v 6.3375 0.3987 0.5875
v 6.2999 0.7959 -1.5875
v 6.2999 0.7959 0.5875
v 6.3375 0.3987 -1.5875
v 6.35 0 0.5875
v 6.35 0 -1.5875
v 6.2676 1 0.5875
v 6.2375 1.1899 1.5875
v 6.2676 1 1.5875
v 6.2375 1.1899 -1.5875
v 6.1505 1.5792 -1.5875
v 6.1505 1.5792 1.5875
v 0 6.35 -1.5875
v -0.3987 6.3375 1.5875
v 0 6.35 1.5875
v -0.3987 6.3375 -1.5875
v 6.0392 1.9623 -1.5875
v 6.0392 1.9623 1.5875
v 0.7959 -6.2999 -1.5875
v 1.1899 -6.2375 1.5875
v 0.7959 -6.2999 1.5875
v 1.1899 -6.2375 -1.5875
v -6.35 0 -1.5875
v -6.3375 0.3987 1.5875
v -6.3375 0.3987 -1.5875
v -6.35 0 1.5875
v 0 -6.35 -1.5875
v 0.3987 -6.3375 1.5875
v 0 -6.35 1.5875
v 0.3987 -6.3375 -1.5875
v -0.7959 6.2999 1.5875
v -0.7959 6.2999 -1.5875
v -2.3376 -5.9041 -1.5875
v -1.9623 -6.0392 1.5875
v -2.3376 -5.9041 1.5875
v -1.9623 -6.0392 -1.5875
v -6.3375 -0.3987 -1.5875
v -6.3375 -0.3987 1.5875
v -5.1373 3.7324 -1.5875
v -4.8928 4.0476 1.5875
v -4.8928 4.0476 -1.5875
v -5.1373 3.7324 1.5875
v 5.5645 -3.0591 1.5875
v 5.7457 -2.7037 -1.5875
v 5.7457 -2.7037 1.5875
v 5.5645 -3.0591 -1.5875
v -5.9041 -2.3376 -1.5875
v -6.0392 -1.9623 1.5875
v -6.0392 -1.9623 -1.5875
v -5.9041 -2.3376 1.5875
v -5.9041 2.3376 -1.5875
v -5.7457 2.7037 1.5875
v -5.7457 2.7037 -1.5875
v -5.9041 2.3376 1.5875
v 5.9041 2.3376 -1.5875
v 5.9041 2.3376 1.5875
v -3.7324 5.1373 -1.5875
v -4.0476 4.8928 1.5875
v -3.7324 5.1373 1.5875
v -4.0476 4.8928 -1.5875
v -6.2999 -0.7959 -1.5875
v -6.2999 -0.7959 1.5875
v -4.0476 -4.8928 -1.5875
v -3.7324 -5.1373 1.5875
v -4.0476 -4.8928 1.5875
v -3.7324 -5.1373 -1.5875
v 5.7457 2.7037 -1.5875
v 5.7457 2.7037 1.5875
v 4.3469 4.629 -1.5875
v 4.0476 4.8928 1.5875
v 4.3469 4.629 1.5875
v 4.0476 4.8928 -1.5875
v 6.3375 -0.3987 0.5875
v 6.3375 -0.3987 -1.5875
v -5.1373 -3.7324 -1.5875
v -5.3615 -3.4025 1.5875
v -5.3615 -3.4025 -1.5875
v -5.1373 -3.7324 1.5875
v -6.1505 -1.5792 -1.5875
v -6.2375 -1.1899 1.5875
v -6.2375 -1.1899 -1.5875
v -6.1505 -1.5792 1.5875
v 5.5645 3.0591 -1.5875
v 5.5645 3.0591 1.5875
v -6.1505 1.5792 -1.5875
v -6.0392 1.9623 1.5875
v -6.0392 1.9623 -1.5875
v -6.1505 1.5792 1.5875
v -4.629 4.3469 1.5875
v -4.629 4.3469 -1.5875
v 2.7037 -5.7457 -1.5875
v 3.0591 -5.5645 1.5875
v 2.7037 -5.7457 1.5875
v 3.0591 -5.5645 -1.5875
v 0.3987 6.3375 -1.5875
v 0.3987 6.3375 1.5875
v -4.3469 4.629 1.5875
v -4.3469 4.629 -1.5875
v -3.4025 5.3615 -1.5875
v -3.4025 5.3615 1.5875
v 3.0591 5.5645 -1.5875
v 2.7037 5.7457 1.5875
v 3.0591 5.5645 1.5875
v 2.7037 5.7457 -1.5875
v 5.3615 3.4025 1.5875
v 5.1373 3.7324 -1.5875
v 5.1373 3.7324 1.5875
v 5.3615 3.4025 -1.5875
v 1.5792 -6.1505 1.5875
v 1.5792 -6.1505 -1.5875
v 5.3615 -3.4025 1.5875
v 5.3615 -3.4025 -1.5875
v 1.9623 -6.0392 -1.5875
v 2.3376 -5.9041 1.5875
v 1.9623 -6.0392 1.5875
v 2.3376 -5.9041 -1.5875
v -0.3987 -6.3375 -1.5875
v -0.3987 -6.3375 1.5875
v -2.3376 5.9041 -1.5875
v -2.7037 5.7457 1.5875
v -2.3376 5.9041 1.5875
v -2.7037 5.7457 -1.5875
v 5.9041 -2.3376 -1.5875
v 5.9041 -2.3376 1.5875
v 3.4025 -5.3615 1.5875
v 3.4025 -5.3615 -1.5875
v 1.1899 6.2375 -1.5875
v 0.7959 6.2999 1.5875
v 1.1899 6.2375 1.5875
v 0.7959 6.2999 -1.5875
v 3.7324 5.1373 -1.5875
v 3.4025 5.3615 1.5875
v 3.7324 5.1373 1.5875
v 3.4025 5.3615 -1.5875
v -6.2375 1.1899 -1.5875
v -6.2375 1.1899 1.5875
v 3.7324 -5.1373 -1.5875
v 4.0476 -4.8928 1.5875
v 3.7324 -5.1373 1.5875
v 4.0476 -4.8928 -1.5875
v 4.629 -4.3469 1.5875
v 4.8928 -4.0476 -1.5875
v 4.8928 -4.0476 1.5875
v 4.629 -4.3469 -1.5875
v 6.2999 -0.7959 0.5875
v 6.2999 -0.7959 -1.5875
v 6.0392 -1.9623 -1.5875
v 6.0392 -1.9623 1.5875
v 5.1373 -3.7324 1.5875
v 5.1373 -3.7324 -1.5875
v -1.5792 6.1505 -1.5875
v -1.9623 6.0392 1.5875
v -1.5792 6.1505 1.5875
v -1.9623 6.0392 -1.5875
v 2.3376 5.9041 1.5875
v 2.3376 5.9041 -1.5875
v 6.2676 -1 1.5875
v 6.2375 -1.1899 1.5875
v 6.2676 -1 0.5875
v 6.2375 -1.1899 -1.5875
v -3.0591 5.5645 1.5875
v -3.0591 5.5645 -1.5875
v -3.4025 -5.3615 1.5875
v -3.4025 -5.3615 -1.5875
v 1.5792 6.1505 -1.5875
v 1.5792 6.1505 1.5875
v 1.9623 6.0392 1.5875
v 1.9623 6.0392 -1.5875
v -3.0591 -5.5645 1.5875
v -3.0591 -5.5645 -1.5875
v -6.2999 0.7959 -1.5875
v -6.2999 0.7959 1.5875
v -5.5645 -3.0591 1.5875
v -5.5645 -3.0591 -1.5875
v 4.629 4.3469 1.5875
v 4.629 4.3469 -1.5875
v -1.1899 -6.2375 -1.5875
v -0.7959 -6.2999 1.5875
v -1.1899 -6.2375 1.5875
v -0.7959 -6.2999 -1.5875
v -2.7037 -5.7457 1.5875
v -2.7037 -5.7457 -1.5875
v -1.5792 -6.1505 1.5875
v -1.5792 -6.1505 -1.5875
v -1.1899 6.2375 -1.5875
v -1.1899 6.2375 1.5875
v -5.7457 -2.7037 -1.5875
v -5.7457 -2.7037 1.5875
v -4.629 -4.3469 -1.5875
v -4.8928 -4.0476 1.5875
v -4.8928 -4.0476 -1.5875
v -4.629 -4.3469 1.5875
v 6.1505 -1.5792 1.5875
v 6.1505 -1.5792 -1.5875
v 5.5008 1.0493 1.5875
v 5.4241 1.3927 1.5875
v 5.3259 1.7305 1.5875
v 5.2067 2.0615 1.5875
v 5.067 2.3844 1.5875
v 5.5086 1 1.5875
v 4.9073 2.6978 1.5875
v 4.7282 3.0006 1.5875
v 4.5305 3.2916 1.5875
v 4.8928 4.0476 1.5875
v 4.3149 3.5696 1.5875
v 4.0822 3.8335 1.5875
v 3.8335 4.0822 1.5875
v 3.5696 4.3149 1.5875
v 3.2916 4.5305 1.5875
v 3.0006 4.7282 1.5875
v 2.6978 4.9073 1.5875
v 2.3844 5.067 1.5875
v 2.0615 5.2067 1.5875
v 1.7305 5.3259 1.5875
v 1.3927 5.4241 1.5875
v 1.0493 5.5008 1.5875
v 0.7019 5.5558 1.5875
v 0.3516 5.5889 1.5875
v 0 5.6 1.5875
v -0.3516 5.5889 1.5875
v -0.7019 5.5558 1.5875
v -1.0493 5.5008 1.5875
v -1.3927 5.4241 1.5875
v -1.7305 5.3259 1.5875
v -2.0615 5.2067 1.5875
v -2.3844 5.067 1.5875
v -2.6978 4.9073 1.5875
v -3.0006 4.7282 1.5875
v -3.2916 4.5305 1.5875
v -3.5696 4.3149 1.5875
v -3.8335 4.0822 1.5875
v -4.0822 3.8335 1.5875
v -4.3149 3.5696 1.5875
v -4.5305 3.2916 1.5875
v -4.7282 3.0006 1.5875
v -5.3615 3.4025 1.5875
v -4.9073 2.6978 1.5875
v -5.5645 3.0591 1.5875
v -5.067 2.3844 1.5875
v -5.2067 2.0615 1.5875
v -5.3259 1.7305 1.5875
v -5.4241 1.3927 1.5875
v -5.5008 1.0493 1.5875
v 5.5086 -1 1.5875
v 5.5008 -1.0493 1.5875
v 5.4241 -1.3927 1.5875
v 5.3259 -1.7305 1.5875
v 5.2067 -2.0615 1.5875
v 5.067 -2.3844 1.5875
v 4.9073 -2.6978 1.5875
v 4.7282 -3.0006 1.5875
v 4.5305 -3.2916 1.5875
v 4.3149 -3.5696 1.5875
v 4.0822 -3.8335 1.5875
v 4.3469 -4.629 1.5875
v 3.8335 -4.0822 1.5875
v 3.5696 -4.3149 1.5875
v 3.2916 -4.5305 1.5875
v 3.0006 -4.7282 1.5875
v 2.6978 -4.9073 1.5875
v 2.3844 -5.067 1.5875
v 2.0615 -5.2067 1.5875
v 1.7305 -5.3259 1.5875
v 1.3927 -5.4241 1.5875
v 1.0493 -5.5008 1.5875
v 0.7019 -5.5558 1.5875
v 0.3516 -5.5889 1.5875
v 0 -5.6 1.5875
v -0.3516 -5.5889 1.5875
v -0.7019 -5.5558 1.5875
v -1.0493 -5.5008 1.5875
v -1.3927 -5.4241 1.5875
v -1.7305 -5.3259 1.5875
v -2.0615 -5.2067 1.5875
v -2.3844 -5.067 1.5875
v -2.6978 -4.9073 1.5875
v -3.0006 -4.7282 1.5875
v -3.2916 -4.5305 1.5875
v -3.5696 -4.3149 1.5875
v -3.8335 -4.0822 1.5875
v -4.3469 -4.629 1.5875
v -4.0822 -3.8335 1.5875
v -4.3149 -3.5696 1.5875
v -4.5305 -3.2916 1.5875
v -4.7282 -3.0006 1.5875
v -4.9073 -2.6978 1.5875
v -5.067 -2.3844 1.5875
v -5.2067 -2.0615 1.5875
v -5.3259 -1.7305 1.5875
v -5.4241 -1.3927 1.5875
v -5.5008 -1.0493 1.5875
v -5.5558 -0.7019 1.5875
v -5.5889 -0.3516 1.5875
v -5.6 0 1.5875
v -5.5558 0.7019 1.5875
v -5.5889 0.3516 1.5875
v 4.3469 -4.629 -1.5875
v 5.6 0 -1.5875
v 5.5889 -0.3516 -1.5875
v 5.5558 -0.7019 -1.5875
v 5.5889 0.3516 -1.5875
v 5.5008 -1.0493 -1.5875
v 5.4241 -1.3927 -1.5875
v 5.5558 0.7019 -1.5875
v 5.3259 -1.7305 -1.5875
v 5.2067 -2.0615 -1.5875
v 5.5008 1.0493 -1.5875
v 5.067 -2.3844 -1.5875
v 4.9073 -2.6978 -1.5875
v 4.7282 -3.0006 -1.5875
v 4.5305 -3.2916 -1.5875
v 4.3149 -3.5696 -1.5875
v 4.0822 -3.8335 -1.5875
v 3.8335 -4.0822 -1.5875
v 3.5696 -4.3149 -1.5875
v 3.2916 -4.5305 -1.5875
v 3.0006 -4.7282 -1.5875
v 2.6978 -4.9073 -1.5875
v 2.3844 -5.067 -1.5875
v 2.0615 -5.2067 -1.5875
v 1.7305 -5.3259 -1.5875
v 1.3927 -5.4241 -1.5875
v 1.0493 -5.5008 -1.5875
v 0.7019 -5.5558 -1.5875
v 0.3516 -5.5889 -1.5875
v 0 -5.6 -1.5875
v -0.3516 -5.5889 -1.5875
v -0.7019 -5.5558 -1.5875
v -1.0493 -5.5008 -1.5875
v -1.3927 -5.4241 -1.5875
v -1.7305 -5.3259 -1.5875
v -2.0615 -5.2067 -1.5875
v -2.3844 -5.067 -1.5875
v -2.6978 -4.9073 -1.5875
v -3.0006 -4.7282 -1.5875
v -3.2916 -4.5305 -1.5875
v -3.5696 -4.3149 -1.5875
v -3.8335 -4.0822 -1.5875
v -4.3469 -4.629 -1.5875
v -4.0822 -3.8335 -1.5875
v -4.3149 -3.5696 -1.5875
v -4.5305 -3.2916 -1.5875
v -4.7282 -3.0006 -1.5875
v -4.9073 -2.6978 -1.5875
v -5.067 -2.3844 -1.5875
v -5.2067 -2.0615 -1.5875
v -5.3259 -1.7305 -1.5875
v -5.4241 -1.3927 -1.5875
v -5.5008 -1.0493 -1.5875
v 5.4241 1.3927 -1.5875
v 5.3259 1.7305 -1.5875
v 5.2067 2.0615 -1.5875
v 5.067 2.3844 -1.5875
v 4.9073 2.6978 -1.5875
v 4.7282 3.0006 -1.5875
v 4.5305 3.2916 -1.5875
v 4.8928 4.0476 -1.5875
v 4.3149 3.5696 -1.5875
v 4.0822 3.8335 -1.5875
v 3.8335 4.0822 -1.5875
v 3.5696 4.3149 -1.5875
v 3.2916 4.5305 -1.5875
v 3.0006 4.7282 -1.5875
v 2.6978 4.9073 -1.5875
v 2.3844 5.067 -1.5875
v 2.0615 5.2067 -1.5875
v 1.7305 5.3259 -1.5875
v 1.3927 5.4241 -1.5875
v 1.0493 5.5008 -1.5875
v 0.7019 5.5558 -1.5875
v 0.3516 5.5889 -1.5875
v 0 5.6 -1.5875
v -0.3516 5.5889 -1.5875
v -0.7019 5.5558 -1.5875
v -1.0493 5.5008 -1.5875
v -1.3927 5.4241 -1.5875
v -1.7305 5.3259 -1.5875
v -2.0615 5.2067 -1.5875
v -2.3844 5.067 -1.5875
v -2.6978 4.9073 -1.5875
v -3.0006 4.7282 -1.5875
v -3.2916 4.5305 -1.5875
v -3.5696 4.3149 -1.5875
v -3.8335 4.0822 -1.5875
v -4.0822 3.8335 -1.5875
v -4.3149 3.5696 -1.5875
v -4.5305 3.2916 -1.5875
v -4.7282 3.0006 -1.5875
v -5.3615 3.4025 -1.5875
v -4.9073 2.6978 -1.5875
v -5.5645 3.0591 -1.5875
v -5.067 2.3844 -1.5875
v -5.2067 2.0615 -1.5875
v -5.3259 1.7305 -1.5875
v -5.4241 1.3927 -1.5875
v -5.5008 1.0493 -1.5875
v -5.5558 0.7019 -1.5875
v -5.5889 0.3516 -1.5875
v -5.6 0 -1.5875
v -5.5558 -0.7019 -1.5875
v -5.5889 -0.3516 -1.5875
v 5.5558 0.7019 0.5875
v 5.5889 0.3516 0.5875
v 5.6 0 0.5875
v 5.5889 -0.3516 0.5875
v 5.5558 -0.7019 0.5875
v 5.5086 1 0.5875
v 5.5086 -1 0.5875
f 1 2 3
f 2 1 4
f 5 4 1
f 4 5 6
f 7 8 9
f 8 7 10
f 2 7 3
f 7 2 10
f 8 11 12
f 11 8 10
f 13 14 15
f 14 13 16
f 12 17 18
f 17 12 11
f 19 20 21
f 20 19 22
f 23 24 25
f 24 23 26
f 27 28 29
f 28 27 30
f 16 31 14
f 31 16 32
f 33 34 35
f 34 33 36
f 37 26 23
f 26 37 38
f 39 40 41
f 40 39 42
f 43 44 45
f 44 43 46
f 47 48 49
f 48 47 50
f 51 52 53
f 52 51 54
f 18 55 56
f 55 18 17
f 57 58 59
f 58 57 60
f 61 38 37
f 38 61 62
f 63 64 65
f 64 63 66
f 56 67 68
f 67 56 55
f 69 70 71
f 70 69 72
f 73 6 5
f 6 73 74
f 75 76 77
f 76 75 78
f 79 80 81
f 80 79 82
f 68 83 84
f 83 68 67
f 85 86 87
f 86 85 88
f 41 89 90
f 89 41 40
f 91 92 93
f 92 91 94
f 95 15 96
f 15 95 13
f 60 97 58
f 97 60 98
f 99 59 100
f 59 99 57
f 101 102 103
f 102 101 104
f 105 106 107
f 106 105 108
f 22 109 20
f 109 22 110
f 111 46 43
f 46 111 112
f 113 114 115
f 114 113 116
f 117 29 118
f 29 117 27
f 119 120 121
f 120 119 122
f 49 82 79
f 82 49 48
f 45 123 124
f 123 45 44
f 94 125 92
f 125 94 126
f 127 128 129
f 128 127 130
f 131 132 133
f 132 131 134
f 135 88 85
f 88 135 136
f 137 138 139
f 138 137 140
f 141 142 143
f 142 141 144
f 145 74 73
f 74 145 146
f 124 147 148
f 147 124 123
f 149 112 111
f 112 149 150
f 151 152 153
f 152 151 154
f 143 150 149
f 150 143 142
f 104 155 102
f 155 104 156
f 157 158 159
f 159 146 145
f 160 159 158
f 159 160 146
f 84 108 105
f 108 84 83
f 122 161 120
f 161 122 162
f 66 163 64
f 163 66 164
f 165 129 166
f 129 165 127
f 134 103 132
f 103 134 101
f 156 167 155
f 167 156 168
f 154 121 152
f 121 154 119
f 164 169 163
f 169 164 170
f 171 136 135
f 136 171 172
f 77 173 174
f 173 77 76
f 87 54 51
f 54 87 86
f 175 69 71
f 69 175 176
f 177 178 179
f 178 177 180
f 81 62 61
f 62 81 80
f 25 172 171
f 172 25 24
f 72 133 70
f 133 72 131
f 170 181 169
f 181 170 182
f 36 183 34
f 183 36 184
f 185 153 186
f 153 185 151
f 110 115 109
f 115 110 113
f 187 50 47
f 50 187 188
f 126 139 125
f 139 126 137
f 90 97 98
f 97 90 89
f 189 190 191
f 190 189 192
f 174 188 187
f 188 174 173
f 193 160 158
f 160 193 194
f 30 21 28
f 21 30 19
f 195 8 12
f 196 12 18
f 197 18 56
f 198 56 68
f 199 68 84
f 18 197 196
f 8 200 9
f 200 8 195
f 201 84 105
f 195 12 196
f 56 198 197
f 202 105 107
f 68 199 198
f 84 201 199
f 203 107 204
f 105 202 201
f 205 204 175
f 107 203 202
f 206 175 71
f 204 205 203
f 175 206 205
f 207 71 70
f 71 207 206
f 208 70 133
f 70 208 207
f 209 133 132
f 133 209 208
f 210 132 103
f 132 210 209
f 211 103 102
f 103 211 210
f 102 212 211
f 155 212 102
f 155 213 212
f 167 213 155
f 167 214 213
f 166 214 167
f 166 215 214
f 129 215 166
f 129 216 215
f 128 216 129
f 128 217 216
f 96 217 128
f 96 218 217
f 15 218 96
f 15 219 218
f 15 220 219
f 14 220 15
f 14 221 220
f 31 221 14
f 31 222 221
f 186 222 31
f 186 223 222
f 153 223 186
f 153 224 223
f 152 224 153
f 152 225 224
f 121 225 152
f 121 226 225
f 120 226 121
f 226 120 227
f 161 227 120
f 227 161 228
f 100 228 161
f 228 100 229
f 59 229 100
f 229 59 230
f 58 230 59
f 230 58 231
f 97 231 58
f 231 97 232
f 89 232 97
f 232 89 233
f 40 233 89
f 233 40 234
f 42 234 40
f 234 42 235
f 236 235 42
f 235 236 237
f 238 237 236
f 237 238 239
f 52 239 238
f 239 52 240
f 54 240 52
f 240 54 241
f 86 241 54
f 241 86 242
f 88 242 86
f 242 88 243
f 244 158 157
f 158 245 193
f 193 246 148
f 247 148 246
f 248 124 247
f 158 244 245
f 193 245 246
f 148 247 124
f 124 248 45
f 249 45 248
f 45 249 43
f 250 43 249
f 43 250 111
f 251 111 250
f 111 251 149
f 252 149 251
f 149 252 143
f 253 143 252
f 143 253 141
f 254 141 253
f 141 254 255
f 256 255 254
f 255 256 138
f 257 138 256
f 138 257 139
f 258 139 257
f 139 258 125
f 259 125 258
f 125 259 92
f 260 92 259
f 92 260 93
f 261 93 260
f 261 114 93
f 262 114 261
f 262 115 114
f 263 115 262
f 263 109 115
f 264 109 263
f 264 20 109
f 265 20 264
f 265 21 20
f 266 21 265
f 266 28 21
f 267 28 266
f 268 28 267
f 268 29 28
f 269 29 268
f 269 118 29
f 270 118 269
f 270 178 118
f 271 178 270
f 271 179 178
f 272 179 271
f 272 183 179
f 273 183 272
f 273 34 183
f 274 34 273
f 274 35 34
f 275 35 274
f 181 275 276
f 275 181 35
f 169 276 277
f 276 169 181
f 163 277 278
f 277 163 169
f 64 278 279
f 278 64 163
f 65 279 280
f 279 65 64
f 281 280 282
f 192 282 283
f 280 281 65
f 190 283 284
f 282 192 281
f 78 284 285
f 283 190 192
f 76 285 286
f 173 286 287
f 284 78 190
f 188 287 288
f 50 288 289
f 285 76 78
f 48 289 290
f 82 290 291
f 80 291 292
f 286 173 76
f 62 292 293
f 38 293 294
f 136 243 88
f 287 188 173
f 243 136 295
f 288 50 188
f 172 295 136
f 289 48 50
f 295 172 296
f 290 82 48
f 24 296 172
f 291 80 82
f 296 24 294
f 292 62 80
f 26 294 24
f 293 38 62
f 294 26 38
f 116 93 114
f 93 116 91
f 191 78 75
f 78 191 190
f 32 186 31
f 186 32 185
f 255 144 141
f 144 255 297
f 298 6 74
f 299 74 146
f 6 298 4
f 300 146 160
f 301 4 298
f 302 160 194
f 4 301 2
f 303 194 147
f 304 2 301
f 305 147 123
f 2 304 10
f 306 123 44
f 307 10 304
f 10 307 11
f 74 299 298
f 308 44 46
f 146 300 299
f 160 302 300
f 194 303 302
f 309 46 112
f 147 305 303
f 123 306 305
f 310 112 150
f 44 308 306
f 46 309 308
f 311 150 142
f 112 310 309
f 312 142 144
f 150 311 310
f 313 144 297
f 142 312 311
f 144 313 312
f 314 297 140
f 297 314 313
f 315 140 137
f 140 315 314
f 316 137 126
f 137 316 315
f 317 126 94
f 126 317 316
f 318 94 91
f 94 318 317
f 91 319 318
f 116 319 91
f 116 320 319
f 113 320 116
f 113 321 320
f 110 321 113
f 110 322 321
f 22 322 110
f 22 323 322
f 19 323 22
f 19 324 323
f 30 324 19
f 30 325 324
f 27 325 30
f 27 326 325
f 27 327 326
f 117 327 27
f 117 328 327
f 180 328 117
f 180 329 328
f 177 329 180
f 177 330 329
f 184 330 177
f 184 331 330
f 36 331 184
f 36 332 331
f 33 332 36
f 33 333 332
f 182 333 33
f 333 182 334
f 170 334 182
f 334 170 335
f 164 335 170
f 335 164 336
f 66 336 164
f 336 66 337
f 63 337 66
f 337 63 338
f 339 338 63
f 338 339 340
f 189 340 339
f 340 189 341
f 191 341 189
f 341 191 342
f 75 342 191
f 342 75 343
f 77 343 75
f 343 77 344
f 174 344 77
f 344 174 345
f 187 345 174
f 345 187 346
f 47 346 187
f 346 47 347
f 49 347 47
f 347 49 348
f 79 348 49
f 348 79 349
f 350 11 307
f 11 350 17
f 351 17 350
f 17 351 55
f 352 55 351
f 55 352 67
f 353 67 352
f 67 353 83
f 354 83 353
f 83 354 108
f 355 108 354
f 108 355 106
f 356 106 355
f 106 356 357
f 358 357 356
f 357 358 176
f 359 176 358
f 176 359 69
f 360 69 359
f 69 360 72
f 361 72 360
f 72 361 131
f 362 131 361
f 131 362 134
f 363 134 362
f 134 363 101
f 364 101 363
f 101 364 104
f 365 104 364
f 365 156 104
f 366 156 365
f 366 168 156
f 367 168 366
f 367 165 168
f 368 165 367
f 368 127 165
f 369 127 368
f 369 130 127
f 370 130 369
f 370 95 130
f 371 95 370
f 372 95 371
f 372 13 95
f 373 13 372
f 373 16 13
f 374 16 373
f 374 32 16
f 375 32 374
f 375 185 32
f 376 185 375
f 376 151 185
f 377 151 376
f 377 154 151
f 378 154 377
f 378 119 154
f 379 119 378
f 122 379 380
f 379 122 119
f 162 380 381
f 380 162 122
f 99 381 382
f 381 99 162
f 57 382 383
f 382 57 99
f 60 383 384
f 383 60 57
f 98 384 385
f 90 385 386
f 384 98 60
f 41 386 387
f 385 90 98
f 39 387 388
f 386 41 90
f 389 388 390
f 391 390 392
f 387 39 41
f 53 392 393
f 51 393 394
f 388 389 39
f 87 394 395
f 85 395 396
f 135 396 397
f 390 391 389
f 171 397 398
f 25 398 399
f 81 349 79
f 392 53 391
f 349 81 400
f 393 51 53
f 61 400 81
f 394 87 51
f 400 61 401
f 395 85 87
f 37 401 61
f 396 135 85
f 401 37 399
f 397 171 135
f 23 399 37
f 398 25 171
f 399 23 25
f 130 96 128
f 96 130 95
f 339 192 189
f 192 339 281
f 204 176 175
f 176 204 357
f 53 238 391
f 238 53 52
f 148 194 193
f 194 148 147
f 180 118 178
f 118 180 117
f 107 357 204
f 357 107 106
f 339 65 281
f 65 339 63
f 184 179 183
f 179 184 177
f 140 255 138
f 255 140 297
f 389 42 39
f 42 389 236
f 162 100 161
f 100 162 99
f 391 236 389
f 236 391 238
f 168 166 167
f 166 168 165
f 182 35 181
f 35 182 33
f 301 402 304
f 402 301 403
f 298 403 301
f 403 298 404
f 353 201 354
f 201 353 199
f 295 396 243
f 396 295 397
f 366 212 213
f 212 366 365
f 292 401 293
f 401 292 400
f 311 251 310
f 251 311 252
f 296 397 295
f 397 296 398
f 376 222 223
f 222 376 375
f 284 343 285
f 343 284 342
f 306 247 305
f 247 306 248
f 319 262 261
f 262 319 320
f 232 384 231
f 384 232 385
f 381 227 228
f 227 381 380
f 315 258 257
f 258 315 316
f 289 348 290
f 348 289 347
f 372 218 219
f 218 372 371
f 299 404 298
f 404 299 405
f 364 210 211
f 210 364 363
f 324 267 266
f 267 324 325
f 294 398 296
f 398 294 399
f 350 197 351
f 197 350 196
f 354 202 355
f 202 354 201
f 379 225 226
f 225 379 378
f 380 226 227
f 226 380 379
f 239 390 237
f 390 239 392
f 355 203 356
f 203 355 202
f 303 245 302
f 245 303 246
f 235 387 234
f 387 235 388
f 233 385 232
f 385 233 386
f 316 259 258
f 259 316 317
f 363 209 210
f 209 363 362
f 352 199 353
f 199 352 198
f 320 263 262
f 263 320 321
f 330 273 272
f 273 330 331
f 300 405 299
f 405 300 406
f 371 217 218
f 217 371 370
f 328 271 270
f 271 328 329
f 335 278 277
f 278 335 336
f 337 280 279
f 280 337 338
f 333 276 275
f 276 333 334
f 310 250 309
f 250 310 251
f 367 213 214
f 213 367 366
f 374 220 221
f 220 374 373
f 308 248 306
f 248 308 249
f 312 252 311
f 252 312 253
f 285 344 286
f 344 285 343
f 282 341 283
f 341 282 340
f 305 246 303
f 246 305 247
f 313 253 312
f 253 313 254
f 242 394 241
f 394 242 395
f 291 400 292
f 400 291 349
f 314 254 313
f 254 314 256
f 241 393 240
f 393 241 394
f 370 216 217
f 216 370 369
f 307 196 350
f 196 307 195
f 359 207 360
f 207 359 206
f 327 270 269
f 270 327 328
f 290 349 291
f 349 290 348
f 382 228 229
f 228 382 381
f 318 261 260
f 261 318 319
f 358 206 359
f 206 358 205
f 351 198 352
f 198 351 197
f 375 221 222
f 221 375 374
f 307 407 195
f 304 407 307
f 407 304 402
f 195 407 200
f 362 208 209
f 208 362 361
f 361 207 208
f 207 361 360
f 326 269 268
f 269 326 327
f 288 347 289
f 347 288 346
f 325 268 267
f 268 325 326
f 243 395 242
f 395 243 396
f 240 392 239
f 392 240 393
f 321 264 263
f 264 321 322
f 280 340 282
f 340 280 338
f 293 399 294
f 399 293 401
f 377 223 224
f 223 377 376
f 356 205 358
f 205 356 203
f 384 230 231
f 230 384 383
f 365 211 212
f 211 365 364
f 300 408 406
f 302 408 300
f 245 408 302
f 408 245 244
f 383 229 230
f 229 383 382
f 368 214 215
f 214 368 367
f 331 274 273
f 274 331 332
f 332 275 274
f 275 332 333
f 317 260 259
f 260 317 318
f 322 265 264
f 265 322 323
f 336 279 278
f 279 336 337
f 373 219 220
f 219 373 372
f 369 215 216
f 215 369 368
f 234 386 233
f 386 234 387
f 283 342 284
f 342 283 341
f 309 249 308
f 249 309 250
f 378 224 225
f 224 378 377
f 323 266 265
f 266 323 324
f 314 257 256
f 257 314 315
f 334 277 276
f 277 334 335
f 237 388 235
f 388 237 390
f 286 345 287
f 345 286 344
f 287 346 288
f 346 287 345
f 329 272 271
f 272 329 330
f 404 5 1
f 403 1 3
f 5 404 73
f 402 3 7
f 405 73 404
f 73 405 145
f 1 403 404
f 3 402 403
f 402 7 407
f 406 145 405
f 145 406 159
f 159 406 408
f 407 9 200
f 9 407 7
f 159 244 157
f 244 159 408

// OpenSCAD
outer_diameter = 12.7; // 0.001
inner_diameter = 11.2; // 0.001
// 6.35
thickness      = 3.175; // 0.001
notch_count    = 1;
notch_width    = 2;
notch_depth    = 1;

$fn = 100;

difference() {
	cylinder(d=outer_diameter, h=thickness  , center=true);
	cylinder(d=inner_diameter, h=thickness*2, center=true);

	mid_diameter = (outer_diameter+inner_diameter)/2;
	circumference = mid_diameter * PI;
	total_notch_places = circumference / (notch_width*2);
	notch_angular_spacing = 360 / total_notch_places;
	for( i=[0:1:notch_count-1] ) {
		rotate([0, 0, i*notch_angular_spacing]) {
			translate([mid_diameter/2, 0, thickness/2]) {
				cube([(outer_diameter-inner_diameter)*2, notch_width, notch_depth*2], center=true);
			}
		}
	}
}
